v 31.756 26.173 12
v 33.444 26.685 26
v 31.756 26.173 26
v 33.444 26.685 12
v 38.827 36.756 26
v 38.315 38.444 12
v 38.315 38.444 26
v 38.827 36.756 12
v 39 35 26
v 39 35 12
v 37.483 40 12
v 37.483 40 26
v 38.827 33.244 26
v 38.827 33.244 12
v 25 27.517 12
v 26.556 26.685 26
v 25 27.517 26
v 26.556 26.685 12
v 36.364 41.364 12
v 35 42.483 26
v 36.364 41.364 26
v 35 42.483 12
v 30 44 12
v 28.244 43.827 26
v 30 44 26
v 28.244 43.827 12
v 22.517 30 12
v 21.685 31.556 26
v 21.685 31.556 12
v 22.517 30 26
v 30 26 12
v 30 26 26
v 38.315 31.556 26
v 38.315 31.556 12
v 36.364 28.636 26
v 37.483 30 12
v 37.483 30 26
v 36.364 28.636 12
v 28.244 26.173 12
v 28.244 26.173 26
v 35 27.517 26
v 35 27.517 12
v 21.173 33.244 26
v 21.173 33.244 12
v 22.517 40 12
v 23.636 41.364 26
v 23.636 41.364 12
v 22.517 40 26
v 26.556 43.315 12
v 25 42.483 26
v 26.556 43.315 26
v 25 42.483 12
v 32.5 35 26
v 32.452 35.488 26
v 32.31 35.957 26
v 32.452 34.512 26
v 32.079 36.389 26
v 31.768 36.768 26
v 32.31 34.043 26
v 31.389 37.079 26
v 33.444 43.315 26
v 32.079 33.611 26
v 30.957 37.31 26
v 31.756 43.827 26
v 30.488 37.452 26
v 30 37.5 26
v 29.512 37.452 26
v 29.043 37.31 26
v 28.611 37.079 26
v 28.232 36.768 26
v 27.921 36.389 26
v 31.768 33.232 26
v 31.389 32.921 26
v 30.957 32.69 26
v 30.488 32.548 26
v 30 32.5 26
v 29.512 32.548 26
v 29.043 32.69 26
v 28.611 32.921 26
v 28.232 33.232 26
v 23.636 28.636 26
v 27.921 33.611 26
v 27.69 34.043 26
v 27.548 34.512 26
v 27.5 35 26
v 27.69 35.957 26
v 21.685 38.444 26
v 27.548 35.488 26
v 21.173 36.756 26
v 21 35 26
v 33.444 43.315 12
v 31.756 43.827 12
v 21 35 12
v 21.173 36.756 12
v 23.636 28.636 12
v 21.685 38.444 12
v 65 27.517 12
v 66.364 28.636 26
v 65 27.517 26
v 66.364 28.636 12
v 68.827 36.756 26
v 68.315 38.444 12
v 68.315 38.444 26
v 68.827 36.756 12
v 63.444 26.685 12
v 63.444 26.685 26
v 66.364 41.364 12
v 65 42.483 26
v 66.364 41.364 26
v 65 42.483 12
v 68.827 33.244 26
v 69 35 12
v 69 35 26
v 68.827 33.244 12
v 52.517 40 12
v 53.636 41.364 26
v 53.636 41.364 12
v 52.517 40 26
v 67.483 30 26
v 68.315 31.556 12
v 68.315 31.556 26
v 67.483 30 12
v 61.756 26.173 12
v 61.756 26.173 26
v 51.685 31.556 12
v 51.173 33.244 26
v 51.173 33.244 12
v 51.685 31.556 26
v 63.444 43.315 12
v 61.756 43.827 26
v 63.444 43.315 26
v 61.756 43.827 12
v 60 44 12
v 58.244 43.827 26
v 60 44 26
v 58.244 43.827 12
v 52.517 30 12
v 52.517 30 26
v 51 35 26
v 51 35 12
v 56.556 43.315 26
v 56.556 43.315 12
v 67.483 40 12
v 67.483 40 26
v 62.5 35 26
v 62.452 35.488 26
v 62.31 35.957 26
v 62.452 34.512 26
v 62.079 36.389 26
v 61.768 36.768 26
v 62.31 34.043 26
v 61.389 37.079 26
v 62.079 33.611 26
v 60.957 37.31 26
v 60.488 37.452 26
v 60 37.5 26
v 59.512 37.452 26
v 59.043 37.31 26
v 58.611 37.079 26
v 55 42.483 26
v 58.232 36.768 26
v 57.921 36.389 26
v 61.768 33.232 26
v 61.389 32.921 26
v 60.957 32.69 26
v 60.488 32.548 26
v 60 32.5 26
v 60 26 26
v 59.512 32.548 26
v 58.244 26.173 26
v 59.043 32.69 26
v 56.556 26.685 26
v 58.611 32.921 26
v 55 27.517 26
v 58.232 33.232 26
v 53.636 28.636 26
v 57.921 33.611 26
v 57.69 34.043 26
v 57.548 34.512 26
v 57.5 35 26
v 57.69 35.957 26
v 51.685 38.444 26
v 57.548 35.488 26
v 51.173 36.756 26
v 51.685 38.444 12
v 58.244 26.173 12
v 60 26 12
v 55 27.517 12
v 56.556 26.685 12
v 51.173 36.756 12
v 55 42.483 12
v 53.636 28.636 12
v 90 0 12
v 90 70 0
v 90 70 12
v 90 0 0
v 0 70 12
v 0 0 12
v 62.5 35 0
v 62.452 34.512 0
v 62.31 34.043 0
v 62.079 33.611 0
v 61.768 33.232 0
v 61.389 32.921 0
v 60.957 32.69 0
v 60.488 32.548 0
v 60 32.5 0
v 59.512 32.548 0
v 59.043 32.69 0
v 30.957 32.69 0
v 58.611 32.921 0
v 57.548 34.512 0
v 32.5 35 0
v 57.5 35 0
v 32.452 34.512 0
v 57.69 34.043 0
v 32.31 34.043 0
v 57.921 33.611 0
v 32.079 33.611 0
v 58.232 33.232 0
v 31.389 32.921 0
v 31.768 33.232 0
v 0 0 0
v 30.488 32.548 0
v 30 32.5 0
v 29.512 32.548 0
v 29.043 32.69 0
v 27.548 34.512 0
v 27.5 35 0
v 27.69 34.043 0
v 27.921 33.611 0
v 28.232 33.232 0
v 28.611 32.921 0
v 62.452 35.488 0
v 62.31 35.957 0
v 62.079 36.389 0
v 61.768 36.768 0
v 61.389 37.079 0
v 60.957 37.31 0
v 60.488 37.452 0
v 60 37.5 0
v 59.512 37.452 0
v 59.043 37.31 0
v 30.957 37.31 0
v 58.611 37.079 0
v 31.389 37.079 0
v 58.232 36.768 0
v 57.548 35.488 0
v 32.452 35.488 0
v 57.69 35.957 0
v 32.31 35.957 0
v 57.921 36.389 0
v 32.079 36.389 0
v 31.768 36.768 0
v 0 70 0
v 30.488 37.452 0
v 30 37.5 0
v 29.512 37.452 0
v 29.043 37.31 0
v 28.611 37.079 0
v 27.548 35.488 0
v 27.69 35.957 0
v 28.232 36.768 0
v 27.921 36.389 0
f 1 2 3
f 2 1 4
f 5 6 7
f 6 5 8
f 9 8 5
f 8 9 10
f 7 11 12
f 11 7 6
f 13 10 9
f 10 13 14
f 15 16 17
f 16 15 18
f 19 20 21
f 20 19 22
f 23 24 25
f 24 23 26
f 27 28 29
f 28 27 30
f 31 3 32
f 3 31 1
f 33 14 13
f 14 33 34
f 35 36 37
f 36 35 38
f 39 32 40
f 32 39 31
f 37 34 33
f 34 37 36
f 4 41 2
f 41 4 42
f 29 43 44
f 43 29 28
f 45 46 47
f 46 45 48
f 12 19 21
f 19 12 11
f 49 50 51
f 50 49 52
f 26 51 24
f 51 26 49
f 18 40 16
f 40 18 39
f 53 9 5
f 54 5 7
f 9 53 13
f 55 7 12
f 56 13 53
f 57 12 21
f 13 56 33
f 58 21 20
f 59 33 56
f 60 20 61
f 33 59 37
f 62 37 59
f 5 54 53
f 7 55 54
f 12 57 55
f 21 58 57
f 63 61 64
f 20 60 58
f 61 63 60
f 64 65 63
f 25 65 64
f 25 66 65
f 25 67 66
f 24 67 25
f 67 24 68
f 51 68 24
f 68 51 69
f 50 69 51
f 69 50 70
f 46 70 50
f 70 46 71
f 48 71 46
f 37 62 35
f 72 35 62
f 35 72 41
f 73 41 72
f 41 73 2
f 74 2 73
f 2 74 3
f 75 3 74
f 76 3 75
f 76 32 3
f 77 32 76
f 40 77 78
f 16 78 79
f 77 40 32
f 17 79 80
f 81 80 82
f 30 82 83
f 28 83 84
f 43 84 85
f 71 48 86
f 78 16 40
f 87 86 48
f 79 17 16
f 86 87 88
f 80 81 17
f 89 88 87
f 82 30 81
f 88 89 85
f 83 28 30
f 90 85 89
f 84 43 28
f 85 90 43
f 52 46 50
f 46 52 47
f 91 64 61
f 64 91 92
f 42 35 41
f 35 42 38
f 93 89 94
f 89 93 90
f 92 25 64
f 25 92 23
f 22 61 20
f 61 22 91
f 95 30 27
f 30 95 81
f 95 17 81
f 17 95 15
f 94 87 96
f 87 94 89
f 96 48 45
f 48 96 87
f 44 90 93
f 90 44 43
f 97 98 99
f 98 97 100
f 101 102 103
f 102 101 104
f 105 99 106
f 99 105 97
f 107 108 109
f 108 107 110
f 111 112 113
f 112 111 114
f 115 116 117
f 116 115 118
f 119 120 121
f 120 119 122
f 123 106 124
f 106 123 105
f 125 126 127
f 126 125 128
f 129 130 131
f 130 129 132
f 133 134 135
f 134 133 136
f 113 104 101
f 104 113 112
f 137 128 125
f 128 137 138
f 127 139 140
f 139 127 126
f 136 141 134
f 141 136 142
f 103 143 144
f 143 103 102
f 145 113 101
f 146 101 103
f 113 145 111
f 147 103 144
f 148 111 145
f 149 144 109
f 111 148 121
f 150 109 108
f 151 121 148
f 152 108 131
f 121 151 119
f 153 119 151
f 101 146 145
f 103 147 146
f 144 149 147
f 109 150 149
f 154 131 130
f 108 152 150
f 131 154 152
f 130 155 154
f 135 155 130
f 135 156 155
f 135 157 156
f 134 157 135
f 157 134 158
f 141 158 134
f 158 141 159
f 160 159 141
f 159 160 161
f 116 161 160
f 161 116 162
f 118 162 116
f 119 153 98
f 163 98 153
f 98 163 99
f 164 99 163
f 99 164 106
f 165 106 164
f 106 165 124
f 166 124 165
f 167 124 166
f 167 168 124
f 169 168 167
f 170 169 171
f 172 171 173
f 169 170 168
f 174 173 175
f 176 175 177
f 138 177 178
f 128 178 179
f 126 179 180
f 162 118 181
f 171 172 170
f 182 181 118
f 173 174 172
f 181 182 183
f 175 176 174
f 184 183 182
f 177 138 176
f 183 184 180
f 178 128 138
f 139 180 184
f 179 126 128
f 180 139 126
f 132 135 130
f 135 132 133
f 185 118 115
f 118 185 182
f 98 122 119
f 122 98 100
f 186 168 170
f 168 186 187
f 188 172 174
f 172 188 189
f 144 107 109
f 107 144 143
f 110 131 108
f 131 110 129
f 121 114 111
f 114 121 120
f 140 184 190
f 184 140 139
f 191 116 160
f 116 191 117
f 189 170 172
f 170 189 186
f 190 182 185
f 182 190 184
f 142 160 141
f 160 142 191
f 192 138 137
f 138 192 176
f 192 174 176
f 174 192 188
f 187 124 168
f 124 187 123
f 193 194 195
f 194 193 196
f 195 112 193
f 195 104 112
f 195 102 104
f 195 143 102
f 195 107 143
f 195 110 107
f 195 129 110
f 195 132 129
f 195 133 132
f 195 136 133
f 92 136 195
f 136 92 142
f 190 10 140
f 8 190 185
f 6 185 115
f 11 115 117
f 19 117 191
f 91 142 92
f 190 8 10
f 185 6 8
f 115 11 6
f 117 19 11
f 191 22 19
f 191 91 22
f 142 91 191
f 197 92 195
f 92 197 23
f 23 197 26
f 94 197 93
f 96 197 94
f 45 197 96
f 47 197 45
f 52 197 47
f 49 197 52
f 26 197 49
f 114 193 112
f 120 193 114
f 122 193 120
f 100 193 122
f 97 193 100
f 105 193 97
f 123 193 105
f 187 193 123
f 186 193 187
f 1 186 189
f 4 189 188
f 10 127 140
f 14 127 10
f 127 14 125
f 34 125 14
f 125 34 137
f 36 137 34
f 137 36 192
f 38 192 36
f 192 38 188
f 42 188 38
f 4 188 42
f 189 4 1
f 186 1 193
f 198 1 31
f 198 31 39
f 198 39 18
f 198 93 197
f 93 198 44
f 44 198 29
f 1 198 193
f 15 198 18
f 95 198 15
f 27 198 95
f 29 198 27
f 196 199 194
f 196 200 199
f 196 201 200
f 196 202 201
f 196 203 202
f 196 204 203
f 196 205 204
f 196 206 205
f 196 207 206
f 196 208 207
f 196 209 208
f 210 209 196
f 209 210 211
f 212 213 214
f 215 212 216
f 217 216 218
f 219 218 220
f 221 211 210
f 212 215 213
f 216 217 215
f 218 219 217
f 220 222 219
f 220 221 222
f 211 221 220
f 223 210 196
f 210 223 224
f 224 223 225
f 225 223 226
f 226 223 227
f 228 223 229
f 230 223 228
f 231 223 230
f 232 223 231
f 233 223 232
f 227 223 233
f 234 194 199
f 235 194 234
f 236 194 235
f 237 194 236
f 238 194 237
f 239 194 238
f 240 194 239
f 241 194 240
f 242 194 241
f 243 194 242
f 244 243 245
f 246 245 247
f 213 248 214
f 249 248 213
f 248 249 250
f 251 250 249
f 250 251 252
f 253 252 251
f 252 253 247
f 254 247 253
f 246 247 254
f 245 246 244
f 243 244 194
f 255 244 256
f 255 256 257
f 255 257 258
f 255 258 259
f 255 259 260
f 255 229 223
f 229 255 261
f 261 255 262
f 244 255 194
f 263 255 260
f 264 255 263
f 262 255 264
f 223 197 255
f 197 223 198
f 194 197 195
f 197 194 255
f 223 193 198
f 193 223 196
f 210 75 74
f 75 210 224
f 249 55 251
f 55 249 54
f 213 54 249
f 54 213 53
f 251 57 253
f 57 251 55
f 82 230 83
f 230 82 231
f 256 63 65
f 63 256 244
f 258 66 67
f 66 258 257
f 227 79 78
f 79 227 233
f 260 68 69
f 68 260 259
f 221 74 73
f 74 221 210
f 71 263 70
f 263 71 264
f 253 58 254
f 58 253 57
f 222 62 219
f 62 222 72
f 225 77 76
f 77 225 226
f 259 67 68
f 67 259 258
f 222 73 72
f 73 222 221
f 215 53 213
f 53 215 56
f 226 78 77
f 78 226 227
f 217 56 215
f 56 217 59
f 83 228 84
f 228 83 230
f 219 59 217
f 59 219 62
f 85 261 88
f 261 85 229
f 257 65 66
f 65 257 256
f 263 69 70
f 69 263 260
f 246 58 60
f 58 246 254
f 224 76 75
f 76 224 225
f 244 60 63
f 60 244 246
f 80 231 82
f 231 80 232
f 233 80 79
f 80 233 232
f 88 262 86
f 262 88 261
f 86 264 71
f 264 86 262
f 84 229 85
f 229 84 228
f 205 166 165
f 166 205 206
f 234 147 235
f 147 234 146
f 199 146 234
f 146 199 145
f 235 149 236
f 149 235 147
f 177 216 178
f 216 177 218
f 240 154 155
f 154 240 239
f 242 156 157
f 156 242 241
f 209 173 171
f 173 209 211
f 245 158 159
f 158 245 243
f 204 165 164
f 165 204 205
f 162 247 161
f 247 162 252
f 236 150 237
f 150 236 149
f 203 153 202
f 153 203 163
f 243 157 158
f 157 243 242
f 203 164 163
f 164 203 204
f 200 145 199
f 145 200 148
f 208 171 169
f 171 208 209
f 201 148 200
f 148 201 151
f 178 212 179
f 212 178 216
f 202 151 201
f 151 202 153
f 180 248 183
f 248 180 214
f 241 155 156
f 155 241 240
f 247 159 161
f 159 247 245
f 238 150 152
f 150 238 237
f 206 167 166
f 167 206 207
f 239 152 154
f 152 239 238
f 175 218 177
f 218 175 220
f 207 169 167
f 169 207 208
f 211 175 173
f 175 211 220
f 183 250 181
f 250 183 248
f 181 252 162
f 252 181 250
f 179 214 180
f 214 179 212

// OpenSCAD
$fn = 32;

// ----------------------------------------------------------------------
// Drill jig: two_boss jig
// ----------------------------------------------------------------------

// --- parameters (mm) ---
plate_l = 90;             // plate length, X
plate_w = 70;             // plate width, Y
plate_t = 12;             // plate thickness
boss_d = 18;              // guide boss diameter
boss_h = 15;              // boss height above the plate
guide_d = 5;              // guide hole diameter
boss_pitch = 30;          // boss pitch
fit_tol = 0.05;           // tolerance for press fits, mm
free_tol = 0.2;           // tolerance for clearance fits, mm

n_boss = 2;  // guide bosses
boss_x0 = (plate_l - (n_boss - 1) * boss_pitch) / 2;  // first boss X
boss_top = plate_t - 1 + boss_h;  // boss crown height
total_h = boss_top;  // overall height

difference() {
  union() {
  cube([plate_l, plate_w, plate_t]);
  for (i = [0 : n_boss - 1])
    translate([boss_x0 + i * boss_pitch, plate_w / 2, plate_t - 1])
      cylinder(h = boss_h, d = boss_d);
  }
  for (i = [0 : n_boss - 1])
    translate([boss_x0 + i * boss_pitch, plate_w / 2, -1])
      cylinder(h = plate_t + boss_h, d = guide_d);
}
